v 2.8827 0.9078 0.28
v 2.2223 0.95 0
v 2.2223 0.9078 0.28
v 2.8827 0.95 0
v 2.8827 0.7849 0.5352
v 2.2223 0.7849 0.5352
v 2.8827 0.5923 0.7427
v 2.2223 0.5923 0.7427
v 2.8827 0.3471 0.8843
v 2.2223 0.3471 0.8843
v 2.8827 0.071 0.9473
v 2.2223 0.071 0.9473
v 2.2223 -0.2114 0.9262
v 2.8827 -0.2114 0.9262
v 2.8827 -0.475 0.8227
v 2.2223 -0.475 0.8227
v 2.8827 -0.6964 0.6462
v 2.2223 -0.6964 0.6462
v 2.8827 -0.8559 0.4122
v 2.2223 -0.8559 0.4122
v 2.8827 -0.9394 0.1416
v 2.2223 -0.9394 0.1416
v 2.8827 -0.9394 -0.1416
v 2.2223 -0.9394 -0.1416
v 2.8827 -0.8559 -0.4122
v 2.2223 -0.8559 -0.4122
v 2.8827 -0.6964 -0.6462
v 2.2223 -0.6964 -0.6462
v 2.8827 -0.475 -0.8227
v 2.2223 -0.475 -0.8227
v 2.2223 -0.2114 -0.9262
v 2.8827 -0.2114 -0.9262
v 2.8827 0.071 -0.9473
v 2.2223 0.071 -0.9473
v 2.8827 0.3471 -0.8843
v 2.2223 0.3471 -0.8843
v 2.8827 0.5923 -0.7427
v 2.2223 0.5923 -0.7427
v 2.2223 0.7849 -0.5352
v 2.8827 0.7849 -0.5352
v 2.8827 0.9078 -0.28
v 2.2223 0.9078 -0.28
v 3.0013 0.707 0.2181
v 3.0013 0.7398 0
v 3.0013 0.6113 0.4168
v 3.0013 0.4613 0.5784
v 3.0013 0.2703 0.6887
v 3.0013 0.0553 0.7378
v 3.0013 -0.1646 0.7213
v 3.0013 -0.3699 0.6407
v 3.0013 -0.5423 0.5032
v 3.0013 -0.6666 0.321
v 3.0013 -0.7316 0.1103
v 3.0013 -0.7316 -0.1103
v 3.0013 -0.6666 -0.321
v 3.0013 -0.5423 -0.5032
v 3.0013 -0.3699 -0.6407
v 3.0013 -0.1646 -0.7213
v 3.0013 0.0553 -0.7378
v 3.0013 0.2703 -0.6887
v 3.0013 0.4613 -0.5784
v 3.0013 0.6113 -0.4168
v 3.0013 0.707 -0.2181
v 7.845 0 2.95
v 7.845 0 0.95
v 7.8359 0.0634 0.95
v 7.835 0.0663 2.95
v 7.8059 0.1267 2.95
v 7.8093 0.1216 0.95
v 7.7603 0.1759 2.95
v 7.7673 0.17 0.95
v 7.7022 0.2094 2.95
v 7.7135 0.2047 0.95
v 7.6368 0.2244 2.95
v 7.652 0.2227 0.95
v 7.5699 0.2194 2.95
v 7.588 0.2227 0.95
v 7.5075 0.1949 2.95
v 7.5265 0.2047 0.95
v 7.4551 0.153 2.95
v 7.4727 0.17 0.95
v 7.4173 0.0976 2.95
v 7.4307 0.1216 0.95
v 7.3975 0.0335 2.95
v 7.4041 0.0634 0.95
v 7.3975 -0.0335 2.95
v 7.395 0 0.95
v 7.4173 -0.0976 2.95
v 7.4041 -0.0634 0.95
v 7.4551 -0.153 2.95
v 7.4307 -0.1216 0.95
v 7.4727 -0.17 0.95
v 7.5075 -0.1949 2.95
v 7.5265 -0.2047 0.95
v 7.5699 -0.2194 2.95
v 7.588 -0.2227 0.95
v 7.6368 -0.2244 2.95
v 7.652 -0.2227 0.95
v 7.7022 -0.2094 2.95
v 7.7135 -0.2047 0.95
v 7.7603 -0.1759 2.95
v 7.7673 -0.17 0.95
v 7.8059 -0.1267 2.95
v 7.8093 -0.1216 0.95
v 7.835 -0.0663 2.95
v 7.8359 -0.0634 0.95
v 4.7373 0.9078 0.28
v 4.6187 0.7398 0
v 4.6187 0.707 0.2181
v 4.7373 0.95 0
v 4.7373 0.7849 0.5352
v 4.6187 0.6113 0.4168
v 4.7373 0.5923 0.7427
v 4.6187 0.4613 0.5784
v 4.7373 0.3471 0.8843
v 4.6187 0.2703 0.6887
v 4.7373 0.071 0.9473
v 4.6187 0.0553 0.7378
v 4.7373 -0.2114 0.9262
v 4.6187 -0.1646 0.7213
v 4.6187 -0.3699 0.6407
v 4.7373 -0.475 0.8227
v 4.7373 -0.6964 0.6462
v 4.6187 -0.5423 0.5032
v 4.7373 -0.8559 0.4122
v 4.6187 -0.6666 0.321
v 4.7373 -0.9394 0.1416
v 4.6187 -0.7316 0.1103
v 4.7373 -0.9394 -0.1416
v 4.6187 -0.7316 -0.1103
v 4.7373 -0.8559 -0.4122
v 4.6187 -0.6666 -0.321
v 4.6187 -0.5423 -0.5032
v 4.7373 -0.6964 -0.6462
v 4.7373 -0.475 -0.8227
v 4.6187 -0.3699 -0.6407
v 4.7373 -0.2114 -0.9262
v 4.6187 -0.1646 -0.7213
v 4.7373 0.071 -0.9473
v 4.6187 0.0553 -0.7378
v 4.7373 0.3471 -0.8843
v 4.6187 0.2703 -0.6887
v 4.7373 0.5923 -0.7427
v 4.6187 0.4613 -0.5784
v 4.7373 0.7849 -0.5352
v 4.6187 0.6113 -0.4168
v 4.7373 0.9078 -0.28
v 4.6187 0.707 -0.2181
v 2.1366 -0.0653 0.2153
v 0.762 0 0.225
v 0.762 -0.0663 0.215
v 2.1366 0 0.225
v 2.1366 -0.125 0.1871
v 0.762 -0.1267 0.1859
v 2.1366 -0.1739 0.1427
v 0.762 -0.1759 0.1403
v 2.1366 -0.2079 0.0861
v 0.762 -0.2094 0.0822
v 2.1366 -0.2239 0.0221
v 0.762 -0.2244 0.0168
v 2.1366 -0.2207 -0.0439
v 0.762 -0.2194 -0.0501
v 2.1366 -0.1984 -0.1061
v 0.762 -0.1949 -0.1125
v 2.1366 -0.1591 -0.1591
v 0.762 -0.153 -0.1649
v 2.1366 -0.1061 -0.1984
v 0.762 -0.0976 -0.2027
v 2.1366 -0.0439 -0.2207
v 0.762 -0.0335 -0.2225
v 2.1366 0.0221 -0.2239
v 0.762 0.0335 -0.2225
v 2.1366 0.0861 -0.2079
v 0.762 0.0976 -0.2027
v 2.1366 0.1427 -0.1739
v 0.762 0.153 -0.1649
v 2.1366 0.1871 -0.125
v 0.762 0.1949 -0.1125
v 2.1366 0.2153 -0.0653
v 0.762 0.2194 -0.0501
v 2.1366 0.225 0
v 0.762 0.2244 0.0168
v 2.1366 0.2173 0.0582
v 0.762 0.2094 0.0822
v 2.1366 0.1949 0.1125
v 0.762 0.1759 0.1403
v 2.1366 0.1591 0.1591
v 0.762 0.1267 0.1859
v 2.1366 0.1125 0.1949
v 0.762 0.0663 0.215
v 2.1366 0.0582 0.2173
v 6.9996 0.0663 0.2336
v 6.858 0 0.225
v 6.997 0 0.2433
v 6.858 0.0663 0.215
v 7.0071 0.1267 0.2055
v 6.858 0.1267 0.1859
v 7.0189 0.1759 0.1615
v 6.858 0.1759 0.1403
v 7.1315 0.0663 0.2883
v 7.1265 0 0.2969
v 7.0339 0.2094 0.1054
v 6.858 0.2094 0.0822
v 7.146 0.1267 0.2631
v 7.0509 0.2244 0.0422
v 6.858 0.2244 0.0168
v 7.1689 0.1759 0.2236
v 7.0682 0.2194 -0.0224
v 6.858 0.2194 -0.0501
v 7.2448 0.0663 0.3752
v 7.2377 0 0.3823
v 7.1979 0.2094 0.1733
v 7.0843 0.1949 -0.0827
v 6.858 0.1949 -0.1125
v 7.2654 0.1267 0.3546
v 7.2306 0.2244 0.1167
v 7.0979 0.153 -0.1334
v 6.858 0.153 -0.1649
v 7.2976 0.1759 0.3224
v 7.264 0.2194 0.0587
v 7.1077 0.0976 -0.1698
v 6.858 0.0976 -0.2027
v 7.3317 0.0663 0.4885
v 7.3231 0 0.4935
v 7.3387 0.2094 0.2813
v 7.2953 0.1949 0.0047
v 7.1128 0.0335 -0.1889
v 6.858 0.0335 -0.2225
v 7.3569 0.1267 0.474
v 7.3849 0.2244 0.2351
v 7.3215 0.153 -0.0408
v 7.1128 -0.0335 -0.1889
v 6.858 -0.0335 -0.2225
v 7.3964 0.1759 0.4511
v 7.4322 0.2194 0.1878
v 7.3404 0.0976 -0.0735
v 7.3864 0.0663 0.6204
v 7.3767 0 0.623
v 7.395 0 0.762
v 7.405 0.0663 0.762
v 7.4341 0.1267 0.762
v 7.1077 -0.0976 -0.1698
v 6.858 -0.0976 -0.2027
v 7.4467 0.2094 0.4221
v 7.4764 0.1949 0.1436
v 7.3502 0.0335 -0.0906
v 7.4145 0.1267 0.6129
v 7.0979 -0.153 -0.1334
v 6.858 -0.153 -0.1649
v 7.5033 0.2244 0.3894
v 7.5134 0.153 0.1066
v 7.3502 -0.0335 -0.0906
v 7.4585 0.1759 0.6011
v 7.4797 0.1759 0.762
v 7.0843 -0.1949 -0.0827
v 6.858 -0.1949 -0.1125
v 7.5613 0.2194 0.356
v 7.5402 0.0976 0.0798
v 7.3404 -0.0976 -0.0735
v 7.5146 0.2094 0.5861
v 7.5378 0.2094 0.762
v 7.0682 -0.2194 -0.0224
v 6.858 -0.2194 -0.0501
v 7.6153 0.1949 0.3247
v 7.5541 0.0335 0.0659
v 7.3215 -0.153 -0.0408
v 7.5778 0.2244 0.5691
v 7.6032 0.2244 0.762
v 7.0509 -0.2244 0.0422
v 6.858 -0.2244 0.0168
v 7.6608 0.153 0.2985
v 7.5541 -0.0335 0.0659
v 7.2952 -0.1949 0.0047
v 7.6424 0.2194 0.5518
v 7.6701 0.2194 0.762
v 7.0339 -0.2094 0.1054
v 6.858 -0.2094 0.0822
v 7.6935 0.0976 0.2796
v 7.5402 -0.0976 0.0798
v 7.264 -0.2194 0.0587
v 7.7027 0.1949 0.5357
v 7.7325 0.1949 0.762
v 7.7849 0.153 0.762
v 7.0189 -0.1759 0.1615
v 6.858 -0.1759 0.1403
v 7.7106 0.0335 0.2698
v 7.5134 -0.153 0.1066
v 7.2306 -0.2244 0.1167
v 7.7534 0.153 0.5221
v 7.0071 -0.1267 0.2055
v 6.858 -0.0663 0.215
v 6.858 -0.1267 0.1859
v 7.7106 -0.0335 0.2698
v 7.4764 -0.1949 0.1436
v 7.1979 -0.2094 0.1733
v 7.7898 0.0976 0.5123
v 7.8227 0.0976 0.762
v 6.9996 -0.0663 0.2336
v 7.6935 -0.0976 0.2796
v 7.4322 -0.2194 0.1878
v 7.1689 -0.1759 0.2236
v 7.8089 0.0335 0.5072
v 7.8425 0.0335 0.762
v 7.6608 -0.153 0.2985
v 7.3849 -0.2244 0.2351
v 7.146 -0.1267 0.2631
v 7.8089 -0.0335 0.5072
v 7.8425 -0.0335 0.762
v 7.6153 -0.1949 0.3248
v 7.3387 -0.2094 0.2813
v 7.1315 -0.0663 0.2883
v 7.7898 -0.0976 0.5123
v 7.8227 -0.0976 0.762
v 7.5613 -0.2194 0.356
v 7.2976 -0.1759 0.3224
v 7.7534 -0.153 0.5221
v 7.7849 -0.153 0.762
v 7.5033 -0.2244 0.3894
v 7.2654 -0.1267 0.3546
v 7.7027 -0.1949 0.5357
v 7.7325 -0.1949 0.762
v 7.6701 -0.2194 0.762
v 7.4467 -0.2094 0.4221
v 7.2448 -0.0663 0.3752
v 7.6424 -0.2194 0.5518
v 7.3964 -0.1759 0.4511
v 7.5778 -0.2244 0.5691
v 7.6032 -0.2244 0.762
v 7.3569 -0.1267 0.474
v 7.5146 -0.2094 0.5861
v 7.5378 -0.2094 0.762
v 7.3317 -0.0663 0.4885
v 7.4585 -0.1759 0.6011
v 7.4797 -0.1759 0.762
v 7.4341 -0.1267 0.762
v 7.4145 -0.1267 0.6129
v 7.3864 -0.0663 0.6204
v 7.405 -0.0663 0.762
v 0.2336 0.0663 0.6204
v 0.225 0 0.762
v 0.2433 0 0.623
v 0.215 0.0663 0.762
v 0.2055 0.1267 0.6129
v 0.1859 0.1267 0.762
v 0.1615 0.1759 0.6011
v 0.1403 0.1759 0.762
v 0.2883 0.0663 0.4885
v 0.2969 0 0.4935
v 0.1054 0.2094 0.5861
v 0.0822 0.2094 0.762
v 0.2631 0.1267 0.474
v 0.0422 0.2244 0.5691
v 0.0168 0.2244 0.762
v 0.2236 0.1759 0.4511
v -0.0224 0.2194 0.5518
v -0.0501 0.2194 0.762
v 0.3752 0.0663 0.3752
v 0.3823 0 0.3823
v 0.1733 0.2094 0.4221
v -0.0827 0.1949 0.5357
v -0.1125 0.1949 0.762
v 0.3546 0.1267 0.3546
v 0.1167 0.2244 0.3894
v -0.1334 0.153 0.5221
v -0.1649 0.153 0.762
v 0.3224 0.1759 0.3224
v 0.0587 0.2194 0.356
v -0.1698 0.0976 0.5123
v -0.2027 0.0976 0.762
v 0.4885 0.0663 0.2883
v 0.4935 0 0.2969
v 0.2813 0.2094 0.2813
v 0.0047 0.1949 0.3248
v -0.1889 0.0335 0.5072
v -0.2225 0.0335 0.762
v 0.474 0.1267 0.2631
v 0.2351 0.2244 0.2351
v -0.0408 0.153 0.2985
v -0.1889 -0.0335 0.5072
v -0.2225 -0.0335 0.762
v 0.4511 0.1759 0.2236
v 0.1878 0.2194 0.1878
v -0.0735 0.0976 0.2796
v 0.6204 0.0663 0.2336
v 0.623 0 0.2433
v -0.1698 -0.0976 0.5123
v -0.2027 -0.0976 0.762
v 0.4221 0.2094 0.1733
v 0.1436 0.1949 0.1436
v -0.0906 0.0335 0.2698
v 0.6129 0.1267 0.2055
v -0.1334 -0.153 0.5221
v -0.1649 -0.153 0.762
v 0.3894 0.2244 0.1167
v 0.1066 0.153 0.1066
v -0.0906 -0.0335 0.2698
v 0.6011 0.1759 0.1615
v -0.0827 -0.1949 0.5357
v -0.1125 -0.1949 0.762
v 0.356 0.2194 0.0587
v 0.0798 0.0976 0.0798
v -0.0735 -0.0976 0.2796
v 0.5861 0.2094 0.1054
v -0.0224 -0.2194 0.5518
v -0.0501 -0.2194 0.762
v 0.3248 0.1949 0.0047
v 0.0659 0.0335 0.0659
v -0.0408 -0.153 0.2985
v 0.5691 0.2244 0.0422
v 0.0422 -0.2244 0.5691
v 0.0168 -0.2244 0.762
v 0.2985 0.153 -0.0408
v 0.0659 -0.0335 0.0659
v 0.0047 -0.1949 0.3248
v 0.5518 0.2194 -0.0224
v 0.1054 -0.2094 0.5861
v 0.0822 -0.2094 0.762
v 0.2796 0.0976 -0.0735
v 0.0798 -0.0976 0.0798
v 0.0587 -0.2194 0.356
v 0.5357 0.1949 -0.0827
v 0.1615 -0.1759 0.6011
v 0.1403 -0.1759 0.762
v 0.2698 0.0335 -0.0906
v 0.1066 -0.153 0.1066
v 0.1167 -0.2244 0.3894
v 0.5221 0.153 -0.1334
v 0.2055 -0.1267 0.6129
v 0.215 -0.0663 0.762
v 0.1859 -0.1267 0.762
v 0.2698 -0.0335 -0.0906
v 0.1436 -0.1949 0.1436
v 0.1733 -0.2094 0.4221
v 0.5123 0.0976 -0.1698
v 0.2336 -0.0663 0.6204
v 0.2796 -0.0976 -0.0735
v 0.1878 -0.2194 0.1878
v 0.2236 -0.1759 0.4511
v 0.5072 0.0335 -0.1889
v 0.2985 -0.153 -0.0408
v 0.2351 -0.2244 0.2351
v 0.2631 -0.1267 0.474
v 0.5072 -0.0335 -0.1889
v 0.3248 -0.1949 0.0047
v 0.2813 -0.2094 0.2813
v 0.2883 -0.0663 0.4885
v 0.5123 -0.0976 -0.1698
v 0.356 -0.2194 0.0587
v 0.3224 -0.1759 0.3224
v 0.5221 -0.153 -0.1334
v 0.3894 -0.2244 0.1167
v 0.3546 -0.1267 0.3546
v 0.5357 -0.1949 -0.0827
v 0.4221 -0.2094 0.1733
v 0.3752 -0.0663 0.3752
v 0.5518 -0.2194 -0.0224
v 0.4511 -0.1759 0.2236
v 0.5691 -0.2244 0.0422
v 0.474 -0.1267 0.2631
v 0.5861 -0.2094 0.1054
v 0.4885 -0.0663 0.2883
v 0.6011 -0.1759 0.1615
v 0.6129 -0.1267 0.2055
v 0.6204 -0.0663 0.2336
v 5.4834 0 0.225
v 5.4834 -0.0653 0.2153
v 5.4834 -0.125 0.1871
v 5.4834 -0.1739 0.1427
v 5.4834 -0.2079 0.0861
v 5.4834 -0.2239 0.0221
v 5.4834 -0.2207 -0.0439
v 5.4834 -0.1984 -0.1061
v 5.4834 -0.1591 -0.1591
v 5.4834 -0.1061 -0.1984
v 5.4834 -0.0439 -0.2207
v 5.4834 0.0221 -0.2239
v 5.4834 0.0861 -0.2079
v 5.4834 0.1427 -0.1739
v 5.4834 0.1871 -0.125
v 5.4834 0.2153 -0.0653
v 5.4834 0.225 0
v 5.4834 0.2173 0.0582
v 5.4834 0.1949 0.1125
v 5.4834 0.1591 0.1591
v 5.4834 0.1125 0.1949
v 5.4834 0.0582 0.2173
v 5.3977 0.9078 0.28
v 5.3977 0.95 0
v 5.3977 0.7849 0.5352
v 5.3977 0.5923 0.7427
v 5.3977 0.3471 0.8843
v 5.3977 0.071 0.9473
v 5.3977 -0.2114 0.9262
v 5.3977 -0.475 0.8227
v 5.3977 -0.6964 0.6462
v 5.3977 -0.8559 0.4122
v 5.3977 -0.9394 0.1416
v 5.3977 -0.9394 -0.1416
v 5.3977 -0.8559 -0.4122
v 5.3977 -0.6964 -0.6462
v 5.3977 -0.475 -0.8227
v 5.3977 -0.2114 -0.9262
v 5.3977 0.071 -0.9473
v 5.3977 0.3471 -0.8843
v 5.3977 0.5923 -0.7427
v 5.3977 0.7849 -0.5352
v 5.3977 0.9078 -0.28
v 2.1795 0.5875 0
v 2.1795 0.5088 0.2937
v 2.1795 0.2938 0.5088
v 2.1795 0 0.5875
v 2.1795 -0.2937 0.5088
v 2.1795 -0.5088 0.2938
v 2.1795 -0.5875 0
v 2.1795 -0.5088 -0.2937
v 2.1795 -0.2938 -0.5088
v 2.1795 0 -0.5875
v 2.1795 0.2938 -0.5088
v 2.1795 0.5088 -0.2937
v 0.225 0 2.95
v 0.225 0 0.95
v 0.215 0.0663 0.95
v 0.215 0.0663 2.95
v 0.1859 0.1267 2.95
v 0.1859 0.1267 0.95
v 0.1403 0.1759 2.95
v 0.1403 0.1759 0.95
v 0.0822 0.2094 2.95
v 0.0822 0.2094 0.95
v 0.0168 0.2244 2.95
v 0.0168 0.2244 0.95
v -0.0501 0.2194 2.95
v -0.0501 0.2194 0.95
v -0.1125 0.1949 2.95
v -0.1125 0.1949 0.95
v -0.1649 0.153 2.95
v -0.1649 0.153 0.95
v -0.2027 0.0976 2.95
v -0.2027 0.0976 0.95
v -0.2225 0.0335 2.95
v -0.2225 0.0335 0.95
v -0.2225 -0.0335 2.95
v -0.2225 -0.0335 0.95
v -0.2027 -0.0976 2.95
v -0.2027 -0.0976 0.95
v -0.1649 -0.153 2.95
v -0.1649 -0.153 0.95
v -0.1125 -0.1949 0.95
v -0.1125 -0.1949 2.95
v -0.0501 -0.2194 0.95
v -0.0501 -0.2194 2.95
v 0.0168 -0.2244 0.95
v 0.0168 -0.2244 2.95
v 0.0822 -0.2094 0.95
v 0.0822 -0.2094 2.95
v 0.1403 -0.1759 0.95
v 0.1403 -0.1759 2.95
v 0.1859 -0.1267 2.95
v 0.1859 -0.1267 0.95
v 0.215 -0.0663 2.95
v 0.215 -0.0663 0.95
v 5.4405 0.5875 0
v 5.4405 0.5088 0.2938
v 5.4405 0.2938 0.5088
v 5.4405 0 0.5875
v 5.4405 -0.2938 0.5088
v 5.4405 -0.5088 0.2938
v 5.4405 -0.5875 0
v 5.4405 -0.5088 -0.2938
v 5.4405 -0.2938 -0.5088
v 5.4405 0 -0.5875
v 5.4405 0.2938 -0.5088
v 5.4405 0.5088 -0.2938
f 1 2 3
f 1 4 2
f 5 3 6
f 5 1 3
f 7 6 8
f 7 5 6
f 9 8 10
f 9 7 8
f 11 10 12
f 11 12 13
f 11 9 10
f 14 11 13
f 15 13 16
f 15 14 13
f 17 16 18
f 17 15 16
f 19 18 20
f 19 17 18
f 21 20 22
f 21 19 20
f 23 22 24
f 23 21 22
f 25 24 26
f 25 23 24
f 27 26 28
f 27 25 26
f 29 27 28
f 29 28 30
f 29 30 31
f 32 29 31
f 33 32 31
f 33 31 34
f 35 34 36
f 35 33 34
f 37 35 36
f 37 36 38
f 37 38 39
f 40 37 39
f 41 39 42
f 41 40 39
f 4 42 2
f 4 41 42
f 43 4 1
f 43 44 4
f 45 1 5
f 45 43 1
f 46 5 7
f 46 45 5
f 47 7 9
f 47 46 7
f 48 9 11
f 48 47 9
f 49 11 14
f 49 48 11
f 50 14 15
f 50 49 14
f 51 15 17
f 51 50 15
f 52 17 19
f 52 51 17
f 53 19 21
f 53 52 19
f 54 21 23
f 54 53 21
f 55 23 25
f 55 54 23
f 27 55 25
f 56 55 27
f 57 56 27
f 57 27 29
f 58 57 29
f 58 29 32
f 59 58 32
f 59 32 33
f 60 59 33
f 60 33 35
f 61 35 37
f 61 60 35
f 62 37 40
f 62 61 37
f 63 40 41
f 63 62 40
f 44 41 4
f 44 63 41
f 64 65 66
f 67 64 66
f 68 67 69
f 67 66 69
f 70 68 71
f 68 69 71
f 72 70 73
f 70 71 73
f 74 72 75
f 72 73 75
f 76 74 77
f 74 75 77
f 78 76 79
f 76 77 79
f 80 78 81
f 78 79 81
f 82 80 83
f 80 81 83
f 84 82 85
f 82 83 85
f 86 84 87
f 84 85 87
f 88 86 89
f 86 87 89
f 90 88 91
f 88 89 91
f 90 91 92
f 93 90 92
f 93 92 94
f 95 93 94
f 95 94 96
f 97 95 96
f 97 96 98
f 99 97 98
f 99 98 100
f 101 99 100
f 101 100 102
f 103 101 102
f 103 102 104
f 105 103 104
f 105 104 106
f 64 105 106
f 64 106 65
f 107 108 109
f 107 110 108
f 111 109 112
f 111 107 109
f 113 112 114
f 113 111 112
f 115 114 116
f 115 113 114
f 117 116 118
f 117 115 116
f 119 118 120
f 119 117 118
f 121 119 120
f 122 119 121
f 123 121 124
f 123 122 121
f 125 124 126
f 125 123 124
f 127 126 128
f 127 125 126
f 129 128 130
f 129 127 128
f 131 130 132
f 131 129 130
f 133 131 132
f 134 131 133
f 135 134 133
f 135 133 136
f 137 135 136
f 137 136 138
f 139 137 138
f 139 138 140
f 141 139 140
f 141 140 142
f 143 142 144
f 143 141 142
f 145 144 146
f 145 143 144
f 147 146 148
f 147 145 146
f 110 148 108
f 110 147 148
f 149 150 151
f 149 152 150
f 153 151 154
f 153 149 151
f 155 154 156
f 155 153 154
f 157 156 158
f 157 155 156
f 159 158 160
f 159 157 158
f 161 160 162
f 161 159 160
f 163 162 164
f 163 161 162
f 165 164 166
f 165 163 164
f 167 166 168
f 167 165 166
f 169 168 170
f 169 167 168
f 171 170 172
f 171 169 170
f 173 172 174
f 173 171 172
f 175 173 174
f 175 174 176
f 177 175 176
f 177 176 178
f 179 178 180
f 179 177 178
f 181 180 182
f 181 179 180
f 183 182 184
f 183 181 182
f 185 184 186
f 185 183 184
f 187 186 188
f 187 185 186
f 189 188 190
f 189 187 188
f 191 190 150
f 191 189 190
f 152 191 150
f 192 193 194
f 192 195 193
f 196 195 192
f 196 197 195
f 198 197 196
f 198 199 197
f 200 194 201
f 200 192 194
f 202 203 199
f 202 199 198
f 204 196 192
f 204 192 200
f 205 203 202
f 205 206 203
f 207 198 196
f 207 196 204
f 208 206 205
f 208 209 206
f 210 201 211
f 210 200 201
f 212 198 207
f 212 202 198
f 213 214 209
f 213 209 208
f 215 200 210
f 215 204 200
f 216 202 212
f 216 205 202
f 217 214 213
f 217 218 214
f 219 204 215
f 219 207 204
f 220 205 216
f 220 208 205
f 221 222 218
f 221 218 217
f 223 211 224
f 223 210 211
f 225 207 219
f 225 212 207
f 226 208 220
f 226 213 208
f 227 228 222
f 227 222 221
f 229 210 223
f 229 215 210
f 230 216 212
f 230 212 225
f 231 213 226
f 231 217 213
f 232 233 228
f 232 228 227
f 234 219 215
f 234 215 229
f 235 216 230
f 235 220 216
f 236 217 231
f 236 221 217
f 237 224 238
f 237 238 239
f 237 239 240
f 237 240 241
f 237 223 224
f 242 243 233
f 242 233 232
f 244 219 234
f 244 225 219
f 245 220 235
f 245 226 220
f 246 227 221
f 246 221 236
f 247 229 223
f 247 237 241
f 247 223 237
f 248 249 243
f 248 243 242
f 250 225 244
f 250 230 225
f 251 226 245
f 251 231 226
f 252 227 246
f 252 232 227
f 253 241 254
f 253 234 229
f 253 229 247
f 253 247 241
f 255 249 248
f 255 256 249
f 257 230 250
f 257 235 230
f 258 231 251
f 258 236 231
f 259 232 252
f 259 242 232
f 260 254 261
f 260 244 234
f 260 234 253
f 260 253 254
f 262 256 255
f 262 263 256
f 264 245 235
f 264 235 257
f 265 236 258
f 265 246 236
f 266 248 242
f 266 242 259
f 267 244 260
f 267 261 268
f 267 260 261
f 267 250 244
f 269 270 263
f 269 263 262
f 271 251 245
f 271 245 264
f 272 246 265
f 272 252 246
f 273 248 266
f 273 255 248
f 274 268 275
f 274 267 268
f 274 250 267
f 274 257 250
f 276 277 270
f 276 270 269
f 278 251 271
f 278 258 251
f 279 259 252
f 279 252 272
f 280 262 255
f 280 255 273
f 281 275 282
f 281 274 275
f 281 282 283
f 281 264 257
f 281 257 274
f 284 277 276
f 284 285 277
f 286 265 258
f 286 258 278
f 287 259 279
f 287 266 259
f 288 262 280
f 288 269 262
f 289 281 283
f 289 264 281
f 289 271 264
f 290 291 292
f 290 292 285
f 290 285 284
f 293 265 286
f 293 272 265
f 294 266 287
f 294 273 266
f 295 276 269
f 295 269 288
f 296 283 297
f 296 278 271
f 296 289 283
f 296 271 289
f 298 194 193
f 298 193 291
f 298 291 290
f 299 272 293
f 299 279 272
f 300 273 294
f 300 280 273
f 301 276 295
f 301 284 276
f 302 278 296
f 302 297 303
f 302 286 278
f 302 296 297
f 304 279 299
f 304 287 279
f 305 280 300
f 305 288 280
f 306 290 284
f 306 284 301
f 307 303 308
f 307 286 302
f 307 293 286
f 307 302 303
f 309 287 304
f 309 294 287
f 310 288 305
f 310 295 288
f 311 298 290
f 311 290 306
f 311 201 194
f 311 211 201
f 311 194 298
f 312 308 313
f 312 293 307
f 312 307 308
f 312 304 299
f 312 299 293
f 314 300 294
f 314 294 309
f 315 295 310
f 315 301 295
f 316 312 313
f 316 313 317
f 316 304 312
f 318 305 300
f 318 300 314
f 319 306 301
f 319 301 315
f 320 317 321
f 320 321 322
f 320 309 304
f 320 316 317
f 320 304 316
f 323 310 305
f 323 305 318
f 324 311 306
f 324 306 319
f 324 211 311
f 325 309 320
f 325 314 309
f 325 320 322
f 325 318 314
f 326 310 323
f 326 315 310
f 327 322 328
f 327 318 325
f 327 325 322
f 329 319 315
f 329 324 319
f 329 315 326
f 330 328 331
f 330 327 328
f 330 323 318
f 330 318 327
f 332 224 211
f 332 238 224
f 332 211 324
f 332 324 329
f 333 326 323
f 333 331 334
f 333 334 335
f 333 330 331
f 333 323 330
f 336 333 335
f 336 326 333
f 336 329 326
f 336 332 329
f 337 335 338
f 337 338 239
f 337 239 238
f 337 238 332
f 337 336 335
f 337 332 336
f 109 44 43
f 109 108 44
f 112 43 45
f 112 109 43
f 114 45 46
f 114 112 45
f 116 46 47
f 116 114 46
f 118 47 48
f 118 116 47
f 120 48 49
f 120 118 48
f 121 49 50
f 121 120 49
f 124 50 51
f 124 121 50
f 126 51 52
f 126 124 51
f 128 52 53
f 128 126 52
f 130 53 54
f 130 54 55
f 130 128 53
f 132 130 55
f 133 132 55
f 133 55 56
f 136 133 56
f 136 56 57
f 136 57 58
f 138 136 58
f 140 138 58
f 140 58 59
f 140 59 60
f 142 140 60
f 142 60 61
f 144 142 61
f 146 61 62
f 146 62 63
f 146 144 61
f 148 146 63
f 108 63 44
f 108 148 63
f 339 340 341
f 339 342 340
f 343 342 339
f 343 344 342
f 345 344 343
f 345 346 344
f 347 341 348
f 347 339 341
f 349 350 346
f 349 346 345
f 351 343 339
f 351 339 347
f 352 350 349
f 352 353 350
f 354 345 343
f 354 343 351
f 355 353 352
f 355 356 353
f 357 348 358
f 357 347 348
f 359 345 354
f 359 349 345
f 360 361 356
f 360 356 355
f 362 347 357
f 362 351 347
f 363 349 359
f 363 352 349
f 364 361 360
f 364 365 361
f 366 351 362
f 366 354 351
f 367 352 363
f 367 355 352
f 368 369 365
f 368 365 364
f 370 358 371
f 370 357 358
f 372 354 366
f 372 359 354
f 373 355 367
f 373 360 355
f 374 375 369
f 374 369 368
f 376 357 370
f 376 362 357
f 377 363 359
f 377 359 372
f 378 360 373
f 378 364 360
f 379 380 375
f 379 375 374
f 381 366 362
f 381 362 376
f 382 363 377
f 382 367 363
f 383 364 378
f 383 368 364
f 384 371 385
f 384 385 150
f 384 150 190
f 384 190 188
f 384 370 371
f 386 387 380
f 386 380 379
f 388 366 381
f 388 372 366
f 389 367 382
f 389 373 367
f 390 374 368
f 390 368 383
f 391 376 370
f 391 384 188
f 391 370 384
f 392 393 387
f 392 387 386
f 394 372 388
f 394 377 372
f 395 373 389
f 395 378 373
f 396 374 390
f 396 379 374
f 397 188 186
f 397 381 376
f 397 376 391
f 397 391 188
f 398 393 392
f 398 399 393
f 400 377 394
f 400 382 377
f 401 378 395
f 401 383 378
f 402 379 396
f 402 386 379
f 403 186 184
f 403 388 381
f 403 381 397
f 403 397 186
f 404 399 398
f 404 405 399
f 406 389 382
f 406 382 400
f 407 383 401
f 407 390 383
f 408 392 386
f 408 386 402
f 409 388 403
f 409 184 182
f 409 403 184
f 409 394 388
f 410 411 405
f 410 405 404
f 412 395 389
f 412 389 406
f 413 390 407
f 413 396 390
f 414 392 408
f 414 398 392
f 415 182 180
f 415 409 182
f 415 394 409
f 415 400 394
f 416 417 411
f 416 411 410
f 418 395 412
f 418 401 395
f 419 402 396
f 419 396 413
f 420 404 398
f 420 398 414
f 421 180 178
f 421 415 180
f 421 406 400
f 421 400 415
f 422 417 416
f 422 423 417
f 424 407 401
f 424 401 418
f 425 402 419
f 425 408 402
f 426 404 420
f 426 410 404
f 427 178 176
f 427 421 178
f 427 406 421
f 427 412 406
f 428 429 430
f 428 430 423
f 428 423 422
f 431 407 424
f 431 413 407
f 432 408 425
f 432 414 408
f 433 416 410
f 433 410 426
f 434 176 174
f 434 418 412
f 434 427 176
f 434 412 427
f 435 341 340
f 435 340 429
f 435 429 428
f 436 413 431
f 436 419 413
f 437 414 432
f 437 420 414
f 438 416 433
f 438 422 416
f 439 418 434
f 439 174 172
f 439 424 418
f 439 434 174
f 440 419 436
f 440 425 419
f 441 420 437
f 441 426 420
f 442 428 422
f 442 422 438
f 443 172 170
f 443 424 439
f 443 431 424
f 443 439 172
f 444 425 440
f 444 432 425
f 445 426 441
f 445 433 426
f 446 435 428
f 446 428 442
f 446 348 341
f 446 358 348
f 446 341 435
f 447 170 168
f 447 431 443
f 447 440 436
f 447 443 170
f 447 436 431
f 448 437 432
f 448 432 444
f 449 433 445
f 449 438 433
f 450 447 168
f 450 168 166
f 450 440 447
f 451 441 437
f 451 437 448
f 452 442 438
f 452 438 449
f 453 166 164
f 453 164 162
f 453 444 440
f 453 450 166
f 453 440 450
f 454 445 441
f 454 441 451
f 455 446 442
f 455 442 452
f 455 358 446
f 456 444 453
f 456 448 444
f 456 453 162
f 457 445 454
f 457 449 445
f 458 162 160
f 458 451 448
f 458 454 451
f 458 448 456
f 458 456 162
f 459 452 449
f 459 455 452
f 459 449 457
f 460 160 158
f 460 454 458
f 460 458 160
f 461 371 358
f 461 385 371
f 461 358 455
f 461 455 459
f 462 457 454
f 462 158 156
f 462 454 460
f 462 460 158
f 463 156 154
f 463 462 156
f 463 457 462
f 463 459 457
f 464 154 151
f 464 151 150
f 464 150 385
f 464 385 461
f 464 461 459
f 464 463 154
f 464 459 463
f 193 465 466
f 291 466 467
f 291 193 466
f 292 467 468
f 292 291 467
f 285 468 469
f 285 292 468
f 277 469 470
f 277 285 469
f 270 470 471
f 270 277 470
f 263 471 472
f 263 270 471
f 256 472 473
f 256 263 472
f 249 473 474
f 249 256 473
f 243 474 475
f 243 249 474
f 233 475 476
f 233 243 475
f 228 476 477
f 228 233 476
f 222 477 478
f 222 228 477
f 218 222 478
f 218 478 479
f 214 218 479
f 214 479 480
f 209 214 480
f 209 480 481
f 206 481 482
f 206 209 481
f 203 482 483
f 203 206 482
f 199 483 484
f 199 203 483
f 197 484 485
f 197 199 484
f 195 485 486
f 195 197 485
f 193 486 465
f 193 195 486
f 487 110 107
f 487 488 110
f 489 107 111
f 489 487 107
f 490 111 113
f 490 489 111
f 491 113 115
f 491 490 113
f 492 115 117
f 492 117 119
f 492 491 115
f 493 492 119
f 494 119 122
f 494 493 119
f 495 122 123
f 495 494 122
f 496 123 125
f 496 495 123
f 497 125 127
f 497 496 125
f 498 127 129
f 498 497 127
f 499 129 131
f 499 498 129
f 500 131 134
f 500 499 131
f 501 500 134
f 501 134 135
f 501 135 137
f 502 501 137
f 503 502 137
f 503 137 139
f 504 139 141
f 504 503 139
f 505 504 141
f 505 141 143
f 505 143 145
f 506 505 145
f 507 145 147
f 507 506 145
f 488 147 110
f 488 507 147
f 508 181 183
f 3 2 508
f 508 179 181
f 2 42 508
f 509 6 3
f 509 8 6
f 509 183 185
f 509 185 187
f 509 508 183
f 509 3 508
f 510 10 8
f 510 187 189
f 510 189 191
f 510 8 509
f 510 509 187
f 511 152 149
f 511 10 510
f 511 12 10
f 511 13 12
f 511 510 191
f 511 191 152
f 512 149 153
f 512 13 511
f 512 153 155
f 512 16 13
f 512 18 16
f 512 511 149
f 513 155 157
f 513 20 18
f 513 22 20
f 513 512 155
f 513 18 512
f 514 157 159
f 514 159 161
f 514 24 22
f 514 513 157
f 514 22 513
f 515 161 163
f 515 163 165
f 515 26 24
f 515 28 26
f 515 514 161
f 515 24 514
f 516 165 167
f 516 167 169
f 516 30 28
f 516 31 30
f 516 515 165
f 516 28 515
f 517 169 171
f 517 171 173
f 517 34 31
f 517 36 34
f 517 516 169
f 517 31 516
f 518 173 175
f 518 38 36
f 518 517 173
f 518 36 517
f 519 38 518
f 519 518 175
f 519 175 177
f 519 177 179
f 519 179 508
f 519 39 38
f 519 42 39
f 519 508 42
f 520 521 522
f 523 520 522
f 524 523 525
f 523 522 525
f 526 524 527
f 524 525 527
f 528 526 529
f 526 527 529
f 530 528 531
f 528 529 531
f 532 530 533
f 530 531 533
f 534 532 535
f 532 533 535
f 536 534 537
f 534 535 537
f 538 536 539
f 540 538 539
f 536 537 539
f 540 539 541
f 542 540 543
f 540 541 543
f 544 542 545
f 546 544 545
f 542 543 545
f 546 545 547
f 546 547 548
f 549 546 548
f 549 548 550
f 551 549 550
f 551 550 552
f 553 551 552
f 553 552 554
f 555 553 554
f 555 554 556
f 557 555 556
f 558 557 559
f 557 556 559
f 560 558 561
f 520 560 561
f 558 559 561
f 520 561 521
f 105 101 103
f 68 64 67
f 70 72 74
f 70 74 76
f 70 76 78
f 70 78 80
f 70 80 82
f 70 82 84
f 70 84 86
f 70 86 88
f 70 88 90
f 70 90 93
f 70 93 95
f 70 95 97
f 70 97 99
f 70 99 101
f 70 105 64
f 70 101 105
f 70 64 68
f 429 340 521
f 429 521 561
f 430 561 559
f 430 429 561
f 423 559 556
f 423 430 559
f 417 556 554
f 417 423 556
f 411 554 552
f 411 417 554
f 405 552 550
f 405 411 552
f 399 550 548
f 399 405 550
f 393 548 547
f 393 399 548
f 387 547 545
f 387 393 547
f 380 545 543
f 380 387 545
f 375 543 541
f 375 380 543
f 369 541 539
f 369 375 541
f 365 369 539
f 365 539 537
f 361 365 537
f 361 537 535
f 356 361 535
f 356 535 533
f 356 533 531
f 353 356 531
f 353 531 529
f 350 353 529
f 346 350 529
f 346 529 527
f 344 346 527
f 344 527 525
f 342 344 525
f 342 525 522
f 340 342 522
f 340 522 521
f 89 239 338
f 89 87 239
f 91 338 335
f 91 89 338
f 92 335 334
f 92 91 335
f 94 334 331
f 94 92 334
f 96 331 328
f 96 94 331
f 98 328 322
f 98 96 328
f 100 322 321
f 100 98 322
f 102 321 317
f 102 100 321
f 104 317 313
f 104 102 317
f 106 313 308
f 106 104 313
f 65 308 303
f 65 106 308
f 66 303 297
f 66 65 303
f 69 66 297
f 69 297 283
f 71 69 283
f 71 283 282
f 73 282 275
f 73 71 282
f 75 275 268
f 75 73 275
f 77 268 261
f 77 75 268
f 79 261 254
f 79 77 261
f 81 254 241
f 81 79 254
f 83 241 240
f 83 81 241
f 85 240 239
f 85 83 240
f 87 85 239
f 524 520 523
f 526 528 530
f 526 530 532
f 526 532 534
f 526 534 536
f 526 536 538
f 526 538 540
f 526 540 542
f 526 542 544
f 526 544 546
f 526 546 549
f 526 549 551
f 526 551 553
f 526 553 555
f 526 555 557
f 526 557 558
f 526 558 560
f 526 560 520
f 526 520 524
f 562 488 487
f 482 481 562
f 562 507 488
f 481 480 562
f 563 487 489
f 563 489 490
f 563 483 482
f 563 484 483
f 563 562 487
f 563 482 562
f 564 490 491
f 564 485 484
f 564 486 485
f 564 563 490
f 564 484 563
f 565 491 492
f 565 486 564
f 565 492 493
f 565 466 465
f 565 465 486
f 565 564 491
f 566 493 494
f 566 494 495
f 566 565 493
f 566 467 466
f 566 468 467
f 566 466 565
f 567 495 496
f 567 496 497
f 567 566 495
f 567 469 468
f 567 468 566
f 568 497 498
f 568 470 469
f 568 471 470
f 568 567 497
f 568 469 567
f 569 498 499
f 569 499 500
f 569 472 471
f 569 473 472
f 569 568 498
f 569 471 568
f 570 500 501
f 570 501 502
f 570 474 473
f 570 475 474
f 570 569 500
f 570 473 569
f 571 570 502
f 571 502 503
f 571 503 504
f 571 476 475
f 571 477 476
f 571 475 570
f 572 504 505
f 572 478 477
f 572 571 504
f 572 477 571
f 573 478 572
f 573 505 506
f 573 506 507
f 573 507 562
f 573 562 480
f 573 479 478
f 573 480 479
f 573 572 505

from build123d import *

# Parameters (mm, degrees)
SKETCH5_R           = 0.225
SKETCH6_R           = 0.225
BOSS_EXTRUDE2_DEPTH = 2


with BuildPart() as part:
    # Sketch1 → Revolve1 (revolve)
    with BuildSketch(Plane.XY):
        Polygon((2.11, 0), (2.222309461, 0.95), (2.882709461, 0.95), (3.001325793, 0.739819784), (4.618674207, 0.739819784), (4.737290539, 0.95), (5.397690539, 0.95), (5.51, 0), align=None)
    revolve(axis=Axis((0, 0, 0), (1, 0, 0)))

    # Sweep4: sweep along a path in Sketch3
    with BuildLine(Plane(origin=(0, 0, 0), x_dir=(1, 0, 0), z_dir=(0, 1, 0))) as sweep4_path:
        Line((0, -0.949999878), (0, -0.762))
        ThreePointArc((0, -0.762), (0.223184633, -0.223184633), (0.762, 0))
        Line((0.762, 0), (2.222309461, 0))
        Line((2.222309461, 0), (5.51, 0))
        Line((5.51, 0), (6.858, 0))
        ThreePointArc((6.858, 0), (7.396815367, -0.223184633), (7.62, -0.762))
        Line((7.62, -0.762), (7.62, -0.949999878))
    # Sketch5 → Sweep4 (sweep)
    with BuildSketch(Plane.XY.offset(0.949999878)):
        Circle(SKETCH5_R)
    sweep(path=sweep4_path.line)

    # Sketch6 → Boss-Extrude2 (add)
    with BuildSketch(Plane.XY.offset(0.949999878)):
        Circle(SKETCH6_R)
        with Locations((7.62, 0)):
            Circle(SKETCH6_R)
    extrude(amount=BOSS_EXTRUDE2_DEPTH)


solid = part.part
